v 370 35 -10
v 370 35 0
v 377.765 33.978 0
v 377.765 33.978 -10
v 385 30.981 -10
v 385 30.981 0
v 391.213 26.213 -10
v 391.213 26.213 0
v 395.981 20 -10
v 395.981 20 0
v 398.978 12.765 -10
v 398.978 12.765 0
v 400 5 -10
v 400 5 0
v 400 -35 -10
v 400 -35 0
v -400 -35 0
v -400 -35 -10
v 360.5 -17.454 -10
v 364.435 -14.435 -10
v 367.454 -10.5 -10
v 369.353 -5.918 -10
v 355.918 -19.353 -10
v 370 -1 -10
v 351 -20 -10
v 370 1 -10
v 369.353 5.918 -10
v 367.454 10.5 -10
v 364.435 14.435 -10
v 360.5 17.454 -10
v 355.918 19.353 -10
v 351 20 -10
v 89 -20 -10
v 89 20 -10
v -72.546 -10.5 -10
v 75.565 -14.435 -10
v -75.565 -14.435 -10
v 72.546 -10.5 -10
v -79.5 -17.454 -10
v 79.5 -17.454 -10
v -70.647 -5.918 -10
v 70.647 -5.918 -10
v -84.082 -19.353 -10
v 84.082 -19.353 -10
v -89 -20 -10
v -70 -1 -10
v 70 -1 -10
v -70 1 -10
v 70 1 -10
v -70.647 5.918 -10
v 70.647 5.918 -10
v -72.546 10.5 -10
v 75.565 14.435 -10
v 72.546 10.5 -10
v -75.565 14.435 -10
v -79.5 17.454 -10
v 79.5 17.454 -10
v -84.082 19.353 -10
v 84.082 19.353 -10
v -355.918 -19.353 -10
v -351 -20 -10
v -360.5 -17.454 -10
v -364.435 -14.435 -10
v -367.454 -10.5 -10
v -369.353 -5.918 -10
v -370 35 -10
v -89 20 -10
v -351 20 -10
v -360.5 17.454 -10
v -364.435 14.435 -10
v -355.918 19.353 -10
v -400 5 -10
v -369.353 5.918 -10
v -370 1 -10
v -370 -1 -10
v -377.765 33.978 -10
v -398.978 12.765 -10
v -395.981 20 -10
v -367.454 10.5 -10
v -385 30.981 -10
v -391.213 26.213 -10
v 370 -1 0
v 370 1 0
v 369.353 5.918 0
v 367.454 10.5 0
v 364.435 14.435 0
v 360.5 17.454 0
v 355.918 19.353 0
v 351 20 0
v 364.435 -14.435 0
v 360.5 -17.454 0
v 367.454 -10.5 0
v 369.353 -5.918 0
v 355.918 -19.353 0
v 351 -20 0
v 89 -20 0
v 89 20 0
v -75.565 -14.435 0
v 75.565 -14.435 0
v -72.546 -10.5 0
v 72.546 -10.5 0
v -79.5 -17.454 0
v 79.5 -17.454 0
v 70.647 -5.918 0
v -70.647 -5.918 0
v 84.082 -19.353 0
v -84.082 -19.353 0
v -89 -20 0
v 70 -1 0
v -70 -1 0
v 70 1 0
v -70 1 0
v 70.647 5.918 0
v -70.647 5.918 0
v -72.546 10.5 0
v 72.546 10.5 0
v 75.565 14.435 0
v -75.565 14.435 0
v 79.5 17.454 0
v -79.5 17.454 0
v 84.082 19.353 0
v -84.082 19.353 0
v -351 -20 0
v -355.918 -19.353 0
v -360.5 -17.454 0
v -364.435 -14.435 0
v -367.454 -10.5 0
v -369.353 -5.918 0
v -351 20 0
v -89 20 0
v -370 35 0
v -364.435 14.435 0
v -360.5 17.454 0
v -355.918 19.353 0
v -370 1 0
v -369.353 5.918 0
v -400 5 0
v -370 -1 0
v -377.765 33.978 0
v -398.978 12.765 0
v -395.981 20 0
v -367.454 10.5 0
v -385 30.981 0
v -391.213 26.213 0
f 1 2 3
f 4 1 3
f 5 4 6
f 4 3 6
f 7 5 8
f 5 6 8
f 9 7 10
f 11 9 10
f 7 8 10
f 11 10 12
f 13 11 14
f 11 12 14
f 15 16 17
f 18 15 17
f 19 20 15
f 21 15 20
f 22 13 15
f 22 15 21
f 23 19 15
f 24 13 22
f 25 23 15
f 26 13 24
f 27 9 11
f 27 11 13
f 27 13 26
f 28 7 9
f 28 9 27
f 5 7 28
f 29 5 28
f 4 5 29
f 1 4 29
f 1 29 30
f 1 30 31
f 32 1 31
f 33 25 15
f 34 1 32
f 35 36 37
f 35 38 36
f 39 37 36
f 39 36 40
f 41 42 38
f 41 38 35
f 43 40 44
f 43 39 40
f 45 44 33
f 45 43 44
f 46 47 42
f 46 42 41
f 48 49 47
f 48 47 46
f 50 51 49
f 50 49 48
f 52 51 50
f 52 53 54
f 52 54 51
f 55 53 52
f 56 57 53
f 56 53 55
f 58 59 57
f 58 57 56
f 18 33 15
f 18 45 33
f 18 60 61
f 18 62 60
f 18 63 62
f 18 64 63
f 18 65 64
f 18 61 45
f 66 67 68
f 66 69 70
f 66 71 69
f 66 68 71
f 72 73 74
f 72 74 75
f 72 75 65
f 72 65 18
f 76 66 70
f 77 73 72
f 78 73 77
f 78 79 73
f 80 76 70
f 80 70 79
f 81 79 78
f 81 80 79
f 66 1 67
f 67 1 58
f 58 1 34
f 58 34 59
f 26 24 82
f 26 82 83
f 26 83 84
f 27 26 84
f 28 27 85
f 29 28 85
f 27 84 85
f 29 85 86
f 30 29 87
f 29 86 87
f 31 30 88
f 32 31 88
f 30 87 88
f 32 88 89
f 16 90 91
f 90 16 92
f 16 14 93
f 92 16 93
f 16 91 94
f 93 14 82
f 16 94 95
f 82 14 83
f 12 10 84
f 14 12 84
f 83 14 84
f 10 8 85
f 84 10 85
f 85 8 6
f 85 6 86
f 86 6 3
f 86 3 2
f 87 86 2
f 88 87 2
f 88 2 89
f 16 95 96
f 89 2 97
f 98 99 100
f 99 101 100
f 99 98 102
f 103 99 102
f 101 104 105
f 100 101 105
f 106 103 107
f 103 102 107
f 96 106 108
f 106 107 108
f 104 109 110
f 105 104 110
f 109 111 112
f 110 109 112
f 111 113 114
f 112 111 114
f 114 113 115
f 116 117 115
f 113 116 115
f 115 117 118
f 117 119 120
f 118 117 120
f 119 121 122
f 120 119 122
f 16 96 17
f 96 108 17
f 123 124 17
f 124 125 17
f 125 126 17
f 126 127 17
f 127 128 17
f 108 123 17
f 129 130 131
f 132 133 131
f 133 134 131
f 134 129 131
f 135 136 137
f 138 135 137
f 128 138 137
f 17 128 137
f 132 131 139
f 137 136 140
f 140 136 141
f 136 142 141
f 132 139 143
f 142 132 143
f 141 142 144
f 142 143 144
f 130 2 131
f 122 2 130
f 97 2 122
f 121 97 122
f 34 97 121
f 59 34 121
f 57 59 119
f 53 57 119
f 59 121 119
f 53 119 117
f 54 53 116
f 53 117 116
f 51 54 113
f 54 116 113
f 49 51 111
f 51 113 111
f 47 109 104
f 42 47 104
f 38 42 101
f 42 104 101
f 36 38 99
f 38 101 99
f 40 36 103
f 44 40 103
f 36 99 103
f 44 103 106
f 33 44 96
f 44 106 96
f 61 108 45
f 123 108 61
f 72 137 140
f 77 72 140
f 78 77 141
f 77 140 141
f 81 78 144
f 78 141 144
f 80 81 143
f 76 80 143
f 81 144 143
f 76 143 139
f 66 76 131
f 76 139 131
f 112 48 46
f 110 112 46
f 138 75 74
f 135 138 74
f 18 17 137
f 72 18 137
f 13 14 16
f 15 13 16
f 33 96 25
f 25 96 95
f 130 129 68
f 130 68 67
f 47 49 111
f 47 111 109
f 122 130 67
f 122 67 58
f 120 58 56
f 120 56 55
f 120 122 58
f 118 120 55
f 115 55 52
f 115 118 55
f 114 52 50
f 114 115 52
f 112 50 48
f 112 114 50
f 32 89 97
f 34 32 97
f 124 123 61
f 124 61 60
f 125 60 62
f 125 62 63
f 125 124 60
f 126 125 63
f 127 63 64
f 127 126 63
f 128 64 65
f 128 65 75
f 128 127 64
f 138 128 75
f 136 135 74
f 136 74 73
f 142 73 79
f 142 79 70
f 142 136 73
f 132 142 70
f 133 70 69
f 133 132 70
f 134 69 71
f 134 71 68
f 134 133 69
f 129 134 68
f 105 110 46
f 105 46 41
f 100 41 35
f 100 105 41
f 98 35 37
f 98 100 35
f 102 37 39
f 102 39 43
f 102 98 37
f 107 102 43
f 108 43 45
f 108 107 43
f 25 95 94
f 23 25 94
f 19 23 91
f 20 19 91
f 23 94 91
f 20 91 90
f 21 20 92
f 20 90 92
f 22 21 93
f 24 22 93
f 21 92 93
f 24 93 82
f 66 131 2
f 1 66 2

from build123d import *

# Parameters (mm, degrees)
TABAN_FLAN_1_DEPTH = 10


# Sheet-metal steps are written as plain solids
with BuildPart() as part:
    # Çizim1 → Taban-Flanş1 (new body)
    with BuildSketch(Plane.XY):
        with BuildLine():
            Line((400, -35), (-400, -35))
            Line((-400, -35), (-400, 5))
            ThreePointArc((-400, 5), (-391.213203436, 26.213203436), (-370, 35))
            Line((-370, 35), (370, 35))
            ThreePointArc((370, 35), (391.213203436, 26.213203436), (400, 5))
            Line((400, 5), (400, -35))
        make_face()
        with BuildLine():
            Line((351, 20), (89, 20))
            ThreePointArc((89, 20), (75.564971157, 14.435028843), (70, 1))
            Line((70, 1), (70, -1))
            ThreePointArc((70, -1), (75.564971157, -14.435028843), (89, -20))
            Line((89, -20), (351, -20))
            ThreePointArc((351, -20), (364.435028843, -14.435028843), (370, -1))
            Line((370, -1), (370, 1))
            ThreePointArc((370, 1), (364.435028843, 14.435028843), (351, 20))
        make_face(mode=Mode.SUBTRACT)
        with BuildLine():
            Line((-70, 1), (-70, -1))
            ThreePointArc((-70, -1), (-75.564971157, -14.435028843), (-89, -20))
            Line((-89, -20), (-351, -20))
            ThreePointArc((-351, -20), (-364.435028843, -14.435028843), (-370, -1))
            Line((-370, -1), (-370, 1))
            ThreePointArc((-370, 1), (-364.435028843, 14.435028843), (-351, 20))
            Line((-351, 20), (-89, 20))
            ThreePointArc((-89, 20), (-75.564971157, 14.435028843), (-70, 1))
        make_face(mode=Mode.SUBTRACT)
    extrude(amount=-TABAN_FLAN_1_DEPTH)


solid = part.part
